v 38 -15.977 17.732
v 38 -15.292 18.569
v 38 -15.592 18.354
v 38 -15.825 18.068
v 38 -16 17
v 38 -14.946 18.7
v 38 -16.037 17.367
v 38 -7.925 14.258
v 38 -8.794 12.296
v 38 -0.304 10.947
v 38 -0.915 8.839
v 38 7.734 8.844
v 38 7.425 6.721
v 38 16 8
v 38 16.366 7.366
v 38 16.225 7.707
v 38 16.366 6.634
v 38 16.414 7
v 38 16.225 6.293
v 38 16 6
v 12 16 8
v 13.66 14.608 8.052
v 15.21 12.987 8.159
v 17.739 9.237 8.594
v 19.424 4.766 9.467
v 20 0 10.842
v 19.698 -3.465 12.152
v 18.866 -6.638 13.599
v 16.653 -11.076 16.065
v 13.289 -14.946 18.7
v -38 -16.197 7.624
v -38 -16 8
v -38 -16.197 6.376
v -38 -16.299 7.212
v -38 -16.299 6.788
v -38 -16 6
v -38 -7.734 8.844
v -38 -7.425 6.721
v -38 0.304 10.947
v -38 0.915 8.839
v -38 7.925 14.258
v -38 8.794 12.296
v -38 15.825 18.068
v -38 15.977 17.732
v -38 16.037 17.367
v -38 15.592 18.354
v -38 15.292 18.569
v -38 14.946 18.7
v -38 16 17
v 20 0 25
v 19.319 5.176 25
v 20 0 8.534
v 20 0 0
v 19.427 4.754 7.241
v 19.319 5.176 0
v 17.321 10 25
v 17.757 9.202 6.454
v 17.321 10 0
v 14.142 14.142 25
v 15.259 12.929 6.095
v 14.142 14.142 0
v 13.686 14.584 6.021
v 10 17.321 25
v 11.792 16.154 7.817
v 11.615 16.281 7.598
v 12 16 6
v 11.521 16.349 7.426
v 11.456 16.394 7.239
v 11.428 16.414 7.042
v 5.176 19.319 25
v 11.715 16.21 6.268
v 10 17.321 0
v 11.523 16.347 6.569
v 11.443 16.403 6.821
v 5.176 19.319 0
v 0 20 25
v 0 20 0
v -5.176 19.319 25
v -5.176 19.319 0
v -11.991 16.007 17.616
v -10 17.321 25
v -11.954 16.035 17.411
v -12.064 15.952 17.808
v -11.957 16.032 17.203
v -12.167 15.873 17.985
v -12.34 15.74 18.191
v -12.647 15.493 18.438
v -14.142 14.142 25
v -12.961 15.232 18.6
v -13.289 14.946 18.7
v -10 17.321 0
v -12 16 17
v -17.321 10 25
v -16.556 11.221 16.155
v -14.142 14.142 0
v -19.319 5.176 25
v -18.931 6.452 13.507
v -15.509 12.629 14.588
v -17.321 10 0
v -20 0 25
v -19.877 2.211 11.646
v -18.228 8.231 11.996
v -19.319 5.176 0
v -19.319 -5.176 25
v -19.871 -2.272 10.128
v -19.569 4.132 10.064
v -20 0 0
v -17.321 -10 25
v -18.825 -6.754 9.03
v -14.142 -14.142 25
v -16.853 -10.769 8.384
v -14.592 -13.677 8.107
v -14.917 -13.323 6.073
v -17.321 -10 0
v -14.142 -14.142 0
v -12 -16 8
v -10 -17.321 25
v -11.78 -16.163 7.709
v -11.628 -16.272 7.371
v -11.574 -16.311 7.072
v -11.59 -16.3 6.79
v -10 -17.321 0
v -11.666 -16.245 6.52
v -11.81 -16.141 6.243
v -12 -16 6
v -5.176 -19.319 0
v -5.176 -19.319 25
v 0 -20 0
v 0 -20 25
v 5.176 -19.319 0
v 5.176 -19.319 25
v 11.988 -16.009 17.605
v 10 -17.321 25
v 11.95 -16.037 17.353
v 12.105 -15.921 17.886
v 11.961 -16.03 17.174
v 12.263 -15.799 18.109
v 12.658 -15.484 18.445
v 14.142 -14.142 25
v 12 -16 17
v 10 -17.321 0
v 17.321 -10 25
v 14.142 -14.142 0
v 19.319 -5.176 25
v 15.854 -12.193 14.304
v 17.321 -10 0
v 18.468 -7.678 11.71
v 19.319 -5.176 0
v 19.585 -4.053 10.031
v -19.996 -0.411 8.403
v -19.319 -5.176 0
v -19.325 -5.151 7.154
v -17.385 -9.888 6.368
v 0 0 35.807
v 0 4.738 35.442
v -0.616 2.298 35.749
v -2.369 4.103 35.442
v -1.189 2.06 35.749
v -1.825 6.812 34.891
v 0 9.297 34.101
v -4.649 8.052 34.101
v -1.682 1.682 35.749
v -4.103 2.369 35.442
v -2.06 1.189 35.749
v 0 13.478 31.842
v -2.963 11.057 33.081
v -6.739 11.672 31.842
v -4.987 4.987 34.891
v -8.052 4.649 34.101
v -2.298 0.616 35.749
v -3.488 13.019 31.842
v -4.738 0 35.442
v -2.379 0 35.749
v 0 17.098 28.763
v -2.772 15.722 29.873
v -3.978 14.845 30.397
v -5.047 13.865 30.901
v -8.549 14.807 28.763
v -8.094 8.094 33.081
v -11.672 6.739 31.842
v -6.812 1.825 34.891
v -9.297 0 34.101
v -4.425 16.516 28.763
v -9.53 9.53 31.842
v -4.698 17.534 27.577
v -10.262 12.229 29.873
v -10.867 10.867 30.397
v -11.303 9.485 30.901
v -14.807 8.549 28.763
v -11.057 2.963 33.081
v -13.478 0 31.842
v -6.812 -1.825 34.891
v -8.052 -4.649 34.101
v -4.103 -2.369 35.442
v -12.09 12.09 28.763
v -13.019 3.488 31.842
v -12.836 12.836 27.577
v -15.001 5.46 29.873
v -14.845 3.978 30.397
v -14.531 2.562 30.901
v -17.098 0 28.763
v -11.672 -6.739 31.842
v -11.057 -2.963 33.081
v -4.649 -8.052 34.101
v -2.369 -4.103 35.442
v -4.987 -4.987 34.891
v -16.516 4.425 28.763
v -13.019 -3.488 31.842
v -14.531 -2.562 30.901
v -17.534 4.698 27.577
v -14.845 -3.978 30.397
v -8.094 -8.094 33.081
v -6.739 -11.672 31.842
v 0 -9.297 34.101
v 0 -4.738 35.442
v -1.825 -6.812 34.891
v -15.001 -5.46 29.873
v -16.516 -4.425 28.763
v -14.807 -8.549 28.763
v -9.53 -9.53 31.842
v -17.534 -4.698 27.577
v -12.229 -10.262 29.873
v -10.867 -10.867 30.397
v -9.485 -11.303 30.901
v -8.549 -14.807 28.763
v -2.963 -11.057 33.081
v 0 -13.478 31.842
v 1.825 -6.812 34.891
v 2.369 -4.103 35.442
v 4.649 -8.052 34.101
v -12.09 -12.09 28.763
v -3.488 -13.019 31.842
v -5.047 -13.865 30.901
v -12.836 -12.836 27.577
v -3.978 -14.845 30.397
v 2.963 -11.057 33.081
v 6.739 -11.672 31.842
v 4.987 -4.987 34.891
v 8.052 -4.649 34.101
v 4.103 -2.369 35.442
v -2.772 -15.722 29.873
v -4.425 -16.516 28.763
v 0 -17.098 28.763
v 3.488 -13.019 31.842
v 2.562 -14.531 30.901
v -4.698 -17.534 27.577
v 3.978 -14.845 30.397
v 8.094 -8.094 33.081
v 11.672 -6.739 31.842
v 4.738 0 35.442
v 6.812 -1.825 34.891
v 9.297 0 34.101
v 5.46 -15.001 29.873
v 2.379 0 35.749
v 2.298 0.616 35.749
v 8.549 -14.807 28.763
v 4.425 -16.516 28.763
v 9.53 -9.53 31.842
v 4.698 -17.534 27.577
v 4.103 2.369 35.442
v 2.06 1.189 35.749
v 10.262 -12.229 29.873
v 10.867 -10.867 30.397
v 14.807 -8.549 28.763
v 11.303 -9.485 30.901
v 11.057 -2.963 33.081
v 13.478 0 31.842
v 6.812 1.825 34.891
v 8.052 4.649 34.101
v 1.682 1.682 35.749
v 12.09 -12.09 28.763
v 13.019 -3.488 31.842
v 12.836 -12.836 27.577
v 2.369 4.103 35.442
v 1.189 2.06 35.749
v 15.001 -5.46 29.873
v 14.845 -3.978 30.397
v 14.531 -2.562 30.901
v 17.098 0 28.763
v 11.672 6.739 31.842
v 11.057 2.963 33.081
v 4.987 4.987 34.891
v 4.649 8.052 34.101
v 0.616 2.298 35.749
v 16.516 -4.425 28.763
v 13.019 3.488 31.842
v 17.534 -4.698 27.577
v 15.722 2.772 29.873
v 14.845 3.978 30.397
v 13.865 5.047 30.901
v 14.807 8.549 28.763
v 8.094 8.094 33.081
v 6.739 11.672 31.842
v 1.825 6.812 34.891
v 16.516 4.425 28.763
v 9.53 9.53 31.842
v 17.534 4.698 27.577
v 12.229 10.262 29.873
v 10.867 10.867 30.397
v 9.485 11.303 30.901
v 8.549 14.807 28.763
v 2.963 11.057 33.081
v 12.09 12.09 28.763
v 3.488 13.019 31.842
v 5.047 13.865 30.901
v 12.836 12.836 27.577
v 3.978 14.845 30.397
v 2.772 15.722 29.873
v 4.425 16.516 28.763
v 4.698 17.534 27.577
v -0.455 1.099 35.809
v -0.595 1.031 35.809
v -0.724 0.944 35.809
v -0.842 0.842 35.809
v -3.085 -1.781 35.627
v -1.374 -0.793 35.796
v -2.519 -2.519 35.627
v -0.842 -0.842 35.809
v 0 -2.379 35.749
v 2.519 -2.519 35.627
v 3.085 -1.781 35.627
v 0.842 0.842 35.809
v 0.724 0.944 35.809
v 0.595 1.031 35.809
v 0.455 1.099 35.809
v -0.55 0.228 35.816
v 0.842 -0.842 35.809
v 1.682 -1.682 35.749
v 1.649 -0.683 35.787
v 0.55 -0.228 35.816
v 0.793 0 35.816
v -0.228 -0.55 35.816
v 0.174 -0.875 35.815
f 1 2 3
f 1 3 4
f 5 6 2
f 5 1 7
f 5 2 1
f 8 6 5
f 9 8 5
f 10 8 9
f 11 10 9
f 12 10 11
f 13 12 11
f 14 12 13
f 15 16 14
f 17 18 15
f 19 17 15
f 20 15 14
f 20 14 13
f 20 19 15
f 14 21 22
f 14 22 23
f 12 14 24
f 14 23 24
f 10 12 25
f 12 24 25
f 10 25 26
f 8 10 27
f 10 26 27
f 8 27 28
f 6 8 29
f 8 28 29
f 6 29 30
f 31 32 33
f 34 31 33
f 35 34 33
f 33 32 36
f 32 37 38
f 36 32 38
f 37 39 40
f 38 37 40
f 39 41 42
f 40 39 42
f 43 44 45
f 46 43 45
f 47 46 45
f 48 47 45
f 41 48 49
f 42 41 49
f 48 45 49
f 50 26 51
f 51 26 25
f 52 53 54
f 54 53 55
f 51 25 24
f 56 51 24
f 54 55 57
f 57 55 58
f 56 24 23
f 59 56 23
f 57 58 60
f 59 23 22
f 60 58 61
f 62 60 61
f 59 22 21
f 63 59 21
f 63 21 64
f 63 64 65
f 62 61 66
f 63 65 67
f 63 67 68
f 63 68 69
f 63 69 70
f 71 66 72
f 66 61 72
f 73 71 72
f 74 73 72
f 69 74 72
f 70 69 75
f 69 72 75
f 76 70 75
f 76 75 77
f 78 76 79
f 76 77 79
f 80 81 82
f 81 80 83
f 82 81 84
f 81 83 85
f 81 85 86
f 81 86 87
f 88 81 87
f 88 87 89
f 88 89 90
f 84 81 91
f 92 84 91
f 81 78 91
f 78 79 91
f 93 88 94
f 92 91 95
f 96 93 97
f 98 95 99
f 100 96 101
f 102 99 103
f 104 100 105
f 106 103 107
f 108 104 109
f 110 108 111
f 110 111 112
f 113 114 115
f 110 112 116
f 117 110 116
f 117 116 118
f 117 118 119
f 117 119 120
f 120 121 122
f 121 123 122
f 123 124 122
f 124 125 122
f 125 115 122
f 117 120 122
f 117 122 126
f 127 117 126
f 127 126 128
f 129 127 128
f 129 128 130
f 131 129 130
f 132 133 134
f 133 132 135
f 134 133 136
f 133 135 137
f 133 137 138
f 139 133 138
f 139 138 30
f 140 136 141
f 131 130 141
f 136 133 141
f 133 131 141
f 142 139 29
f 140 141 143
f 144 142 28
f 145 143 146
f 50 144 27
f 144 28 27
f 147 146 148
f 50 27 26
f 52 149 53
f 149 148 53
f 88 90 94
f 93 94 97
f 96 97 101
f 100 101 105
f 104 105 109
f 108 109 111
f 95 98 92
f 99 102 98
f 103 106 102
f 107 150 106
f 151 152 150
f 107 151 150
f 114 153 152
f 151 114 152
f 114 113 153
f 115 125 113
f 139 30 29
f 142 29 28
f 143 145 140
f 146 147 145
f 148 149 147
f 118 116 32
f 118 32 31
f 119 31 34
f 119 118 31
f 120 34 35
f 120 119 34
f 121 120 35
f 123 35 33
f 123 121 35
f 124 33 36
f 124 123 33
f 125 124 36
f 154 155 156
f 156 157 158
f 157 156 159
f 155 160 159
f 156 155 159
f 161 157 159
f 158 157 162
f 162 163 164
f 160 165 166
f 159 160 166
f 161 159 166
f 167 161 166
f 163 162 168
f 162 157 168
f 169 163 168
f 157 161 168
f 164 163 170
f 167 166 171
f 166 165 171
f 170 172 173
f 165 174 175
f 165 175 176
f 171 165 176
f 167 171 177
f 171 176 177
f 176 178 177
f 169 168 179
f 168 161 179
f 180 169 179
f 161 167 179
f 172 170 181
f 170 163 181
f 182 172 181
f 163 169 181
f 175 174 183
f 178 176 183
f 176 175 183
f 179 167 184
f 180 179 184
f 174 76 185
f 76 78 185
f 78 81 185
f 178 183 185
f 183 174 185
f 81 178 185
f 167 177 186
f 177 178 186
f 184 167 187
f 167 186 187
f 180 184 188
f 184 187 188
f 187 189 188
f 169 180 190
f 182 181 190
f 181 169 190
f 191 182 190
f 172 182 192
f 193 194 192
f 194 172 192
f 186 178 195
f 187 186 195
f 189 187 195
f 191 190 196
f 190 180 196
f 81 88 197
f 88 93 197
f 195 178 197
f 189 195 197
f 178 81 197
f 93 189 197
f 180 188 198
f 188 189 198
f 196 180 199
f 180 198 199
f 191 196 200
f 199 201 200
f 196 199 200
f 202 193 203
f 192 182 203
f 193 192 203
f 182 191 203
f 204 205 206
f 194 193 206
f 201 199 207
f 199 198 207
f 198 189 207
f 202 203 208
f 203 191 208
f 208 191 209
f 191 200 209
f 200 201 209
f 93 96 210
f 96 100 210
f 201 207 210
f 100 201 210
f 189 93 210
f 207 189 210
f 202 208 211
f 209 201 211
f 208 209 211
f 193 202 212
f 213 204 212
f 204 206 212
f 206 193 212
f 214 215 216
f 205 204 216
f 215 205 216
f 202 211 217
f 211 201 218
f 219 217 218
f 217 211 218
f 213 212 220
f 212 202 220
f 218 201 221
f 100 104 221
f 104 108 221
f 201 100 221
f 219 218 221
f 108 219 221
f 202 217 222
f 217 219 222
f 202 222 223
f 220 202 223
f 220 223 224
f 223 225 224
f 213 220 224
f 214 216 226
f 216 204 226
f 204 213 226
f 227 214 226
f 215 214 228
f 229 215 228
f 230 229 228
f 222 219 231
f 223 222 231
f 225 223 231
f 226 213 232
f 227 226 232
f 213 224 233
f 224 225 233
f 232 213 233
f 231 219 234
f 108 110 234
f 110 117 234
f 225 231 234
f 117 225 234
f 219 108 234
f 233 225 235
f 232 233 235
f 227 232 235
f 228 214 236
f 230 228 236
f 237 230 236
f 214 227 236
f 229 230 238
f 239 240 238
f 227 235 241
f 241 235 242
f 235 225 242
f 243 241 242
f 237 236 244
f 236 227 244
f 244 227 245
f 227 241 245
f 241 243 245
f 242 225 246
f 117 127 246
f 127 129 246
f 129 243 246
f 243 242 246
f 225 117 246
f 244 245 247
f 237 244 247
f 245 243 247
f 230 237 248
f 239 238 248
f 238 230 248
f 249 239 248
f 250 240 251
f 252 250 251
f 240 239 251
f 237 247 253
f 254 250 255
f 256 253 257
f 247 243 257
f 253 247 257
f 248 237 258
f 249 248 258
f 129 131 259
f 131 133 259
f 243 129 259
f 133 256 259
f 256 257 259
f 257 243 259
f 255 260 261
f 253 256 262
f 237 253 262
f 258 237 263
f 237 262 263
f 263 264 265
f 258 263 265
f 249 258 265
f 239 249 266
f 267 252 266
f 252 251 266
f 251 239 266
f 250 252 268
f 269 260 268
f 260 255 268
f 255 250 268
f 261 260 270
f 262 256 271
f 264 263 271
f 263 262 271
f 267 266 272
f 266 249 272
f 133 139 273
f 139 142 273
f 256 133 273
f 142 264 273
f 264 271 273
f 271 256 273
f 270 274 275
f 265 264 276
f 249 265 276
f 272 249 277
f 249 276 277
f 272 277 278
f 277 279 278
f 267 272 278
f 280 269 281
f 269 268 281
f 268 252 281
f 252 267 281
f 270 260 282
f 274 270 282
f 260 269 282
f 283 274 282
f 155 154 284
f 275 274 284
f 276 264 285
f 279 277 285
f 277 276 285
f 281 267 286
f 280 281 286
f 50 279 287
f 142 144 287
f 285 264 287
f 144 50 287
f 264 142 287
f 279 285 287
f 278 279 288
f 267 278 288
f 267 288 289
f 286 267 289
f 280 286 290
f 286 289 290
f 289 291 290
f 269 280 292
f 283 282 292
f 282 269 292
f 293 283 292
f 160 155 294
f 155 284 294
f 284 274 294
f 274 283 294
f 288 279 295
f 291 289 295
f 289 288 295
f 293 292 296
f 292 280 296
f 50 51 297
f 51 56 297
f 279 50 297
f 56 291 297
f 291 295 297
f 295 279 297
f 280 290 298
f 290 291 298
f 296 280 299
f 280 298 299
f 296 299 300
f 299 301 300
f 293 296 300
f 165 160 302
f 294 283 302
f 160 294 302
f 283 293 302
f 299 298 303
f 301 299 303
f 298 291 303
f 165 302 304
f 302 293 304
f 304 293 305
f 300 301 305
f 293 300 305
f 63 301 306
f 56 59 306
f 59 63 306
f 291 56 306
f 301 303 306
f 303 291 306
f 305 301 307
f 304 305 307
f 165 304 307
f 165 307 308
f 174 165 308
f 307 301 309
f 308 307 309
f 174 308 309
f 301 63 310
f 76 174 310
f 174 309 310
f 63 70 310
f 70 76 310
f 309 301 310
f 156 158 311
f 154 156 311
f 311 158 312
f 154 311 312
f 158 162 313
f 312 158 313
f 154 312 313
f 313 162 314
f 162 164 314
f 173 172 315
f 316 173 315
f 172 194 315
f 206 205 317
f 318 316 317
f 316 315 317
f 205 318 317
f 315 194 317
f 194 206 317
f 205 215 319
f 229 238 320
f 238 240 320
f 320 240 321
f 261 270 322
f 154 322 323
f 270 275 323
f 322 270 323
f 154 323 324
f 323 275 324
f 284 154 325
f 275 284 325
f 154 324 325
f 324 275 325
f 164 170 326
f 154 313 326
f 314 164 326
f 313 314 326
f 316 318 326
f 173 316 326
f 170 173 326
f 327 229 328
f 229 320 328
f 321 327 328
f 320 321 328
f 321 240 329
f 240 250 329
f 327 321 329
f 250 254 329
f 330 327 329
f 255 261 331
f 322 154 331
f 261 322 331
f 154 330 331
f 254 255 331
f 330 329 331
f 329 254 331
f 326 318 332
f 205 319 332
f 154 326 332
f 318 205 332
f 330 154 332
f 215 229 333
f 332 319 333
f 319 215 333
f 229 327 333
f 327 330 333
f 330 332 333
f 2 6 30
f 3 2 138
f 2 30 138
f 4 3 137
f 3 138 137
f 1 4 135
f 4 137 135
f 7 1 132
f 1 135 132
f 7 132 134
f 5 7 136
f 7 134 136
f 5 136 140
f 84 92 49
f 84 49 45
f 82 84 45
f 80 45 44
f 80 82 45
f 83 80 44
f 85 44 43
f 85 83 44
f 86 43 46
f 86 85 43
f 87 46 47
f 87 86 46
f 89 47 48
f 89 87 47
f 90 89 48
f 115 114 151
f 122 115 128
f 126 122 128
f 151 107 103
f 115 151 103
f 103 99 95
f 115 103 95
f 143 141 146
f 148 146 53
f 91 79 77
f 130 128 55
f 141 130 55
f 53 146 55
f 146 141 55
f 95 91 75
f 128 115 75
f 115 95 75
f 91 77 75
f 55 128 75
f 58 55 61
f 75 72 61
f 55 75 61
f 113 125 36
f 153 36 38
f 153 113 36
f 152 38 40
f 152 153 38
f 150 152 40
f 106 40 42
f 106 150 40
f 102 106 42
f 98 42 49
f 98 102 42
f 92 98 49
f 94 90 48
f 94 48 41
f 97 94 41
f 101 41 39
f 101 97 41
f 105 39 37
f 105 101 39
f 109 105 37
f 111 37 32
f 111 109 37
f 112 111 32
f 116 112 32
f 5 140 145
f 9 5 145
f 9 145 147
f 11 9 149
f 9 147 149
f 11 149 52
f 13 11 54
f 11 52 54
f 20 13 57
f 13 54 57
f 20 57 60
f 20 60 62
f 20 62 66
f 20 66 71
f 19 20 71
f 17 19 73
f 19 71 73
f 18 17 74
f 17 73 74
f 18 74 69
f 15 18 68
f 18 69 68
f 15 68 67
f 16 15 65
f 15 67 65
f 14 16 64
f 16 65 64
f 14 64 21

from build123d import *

# Parameters (mm, degrees)
SKETCH1_R      = 20
EXTRUDE1_DEPTH = 25
EXTRUDE2_DEPTH = 38
EXTRUDE3_DEPTH = 38


with BuildPart() as part:
    # Sketch1 → Extrude1 (new body)
    with BuildSketch(Plane.XY):
        Circle(SKETCH1_R)
    extrude(amount=EXTRUDE1_DEPTH)

    # Sketch2 → Revolve1 (revolve)
    with BuildSketch(Plane(origin=(0, 0, 0), x_dir=(0, 0, -1), z_dir=(1, 0, 0))):
        with BuildLine():
            Line((-25, 0), (-35.80749354, 0))
            ThreePointArc((-35.80749354, 0), (-33.08089551, 11.446663385), (-25, 20))
            Line((-25, 20), (-25, 0))
        make_face()
    revolve(axis=Axis((0, 0, 25), (0, 0, 1)))

    # Sketch3 → Extrude2 (add)
    with BuildSketch(Plane(origin=(0, 0, 0), x_dir=(0, 0, -1), z_dir=(1, 0, 0))):
        with BuildLine():
            ThreePointArc((-17, -16), (-8.838692689, -0.914824388), (-6, 16))
            ThreePointArc((-6, 16), (-7, 16.414213562), (-8, 16))
            ThreePointArc((-8, 16), (-10.94657476, -0.304222576), (-18.7, -14.946434625))
            ThreePointArc((-18.7, -14.946434625), (-18.068200534, -15.82529884), (-17, -16))
        make_face()
    extrude(amount=EXTRUDE2_DEPTH)

    # Sketch4 → Extrude3 (add)
    with BuildSketch(Plane(origin=(0, 0, 0), x_dir=(0, 0, -1), z_dir=(1, 0, 0))):
        with BuildLine():
            ThreePointArc((-8, -16), (-7, -16.312065741), (-6, -16))
            ThreePointArc((-6, -16), (-8.838692689, 0.914824388), (-17, 16))
            ThreePointArc((-17, 16), (-18.068200534, 15.82529884), (-18.7, 14.946434625))
            ThreePointArc((-18.7, 14.946434625), (-10.94657476, 0.304222576), (-8, -16))
        make_face()
    extrude(amount=-EXTRUDE3_DEPTH)


solid = part.part
